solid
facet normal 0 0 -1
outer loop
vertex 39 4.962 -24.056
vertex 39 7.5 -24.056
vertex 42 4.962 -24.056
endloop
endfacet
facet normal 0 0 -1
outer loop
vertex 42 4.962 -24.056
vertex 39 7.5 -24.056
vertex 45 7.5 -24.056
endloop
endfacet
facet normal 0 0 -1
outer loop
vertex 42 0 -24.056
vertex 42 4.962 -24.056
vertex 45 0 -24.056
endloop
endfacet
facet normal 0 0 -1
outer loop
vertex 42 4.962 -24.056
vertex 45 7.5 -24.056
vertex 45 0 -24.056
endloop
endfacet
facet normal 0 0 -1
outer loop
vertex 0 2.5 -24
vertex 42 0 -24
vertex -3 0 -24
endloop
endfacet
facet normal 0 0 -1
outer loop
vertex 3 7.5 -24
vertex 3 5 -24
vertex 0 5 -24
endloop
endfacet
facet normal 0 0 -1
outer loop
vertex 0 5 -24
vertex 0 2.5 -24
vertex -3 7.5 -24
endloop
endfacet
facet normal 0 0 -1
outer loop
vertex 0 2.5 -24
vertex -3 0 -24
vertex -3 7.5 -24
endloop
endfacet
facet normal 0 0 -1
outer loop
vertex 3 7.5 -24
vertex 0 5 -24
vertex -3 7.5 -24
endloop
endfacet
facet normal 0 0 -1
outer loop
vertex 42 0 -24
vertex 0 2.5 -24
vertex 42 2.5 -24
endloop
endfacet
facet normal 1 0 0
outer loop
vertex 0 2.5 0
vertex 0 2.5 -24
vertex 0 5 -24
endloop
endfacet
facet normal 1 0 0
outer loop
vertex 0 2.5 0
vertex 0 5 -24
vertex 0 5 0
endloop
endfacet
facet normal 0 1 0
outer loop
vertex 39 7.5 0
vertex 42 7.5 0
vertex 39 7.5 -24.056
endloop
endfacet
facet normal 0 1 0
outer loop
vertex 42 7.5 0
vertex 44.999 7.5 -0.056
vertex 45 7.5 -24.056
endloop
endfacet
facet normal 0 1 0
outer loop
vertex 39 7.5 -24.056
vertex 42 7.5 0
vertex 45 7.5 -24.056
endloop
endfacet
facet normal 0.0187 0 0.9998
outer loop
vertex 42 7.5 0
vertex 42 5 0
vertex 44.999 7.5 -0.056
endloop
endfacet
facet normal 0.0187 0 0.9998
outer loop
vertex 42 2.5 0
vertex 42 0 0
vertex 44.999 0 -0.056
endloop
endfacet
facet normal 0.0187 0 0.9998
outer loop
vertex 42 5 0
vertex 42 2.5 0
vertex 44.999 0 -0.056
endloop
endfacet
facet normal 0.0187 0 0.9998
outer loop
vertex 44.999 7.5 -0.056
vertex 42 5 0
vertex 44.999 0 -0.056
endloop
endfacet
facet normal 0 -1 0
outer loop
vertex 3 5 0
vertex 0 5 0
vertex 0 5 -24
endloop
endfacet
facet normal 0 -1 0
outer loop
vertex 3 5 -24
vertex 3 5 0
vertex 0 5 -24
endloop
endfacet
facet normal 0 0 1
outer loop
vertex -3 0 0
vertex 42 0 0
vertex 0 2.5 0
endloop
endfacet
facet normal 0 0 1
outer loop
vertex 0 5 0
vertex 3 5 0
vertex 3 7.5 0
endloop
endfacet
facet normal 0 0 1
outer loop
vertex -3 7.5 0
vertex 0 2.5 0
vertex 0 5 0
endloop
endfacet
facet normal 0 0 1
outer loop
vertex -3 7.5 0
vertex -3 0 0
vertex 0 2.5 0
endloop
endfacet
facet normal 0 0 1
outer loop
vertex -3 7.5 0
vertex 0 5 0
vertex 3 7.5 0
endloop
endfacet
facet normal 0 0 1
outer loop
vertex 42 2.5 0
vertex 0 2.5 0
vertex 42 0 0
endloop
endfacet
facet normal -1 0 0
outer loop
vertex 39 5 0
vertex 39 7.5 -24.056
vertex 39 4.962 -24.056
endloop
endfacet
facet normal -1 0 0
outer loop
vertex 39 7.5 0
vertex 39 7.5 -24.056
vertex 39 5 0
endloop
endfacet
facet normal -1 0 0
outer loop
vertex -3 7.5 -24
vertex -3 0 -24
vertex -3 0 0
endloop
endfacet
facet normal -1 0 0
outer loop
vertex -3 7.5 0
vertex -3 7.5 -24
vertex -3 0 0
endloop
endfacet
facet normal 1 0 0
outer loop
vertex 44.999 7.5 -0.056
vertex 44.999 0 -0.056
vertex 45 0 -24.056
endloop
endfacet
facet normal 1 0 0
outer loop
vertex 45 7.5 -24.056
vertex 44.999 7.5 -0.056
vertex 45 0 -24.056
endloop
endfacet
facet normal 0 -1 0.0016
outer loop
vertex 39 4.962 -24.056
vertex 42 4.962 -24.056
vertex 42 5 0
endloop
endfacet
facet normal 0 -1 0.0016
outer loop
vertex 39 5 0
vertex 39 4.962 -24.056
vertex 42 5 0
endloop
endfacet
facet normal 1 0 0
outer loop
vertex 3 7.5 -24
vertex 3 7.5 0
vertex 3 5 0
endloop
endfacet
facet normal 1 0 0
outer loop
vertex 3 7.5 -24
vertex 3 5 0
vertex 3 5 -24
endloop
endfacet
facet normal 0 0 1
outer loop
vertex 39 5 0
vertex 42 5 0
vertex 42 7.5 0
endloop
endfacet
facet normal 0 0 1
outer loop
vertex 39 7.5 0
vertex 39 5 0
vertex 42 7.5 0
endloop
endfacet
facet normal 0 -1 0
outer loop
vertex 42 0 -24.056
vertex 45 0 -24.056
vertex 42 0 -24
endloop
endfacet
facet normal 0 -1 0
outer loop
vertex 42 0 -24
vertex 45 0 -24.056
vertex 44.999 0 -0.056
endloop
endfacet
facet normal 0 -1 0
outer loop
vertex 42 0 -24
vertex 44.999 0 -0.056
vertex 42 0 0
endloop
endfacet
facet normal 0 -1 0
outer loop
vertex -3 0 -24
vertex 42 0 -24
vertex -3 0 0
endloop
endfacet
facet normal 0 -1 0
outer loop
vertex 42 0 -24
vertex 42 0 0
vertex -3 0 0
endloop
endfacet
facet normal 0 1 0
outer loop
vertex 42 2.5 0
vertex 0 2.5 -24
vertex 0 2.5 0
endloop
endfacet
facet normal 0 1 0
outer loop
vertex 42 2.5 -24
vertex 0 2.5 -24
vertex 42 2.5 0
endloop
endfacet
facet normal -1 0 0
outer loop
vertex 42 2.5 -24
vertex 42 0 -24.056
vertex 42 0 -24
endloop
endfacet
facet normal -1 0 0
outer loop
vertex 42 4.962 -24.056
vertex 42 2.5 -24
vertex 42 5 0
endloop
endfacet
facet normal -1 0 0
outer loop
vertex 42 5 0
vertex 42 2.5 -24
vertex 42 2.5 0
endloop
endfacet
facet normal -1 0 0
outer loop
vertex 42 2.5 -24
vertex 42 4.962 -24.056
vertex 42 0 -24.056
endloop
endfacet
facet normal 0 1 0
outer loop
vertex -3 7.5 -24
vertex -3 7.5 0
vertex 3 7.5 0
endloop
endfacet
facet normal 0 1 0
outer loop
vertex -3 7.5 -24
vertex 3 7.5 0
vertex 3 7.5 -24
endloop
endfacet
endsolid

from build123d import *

# Parameters (mm, degrees)
ESQUISSE1_W        = 42
ESQUISSE1_H        = 24
BOSS_EXTRU_2_DEPTH = 2.5
ESQUISSE3_W        = 3
ESQUISSE3_H        = 24
BOSS_EXTRU_5_DEPTH = 7.5
BOSS_EXTRU_6_DEPTH = 3
ESQUISSE7_W        = 24
ESQUISSE7_H        = 2.5
BOSS_EXTRU_7_DEPTH = 3


with BuildPart() as part:
    # Esquisse1 → Boss.-Extru.2 (new body)
    with BuildSketch(Plane(origin=(0, 0, 0), x_dir=(1, 0, 0), z_dir=(0, 1, 0))):
        with Locations((21, 12)):
            Rectangle(ESQUISSE1_W, ESQUISSE1_H)
    extrude(amount=BOSS_EXTRU_2_DEPTH)

    # Esquisse3 → Boss.-Extru.5 (add)
    with BuildSketch(Plane.XZ):
        Polygon((42, 0), (44.999473272, -0.056214692), (45, -24.056214686), (42, -24.056214686), align=None)
        with Locations((-1.5, -12)):
            Rectangle(ESQUISSE3_W, ESQUISSE3_H)
    extrude(amount=-BOSS_EXTRU_5_DEPTH)

    # Esquisse6 → Boss.-Extru.6 (add)
    with BuildSketch(Plane.ZY.offset(-42)):
        Polygon((-24.056214686, 4.962472786), (0, 5), (0, 7.5), (-24.056214686, 7.5), align=None)
    extrude(amount=BOSS_EXTRU_6_DEPTH)

    # Esquisse7 → Boss.-Extru.7 (add)
    with BuildSketch(Plane(origin=(0, 0, 0), x_dir=(0, 0, -1), z_dir=(1, 0, 0))):
        with Locations((12, 6.25)):
            Rectangle(ESQUISSE7_W, ESQUISSE7_H)
    extrude(amount=BOSS_EXTRU_7_DEPTH)


solid = part.part
